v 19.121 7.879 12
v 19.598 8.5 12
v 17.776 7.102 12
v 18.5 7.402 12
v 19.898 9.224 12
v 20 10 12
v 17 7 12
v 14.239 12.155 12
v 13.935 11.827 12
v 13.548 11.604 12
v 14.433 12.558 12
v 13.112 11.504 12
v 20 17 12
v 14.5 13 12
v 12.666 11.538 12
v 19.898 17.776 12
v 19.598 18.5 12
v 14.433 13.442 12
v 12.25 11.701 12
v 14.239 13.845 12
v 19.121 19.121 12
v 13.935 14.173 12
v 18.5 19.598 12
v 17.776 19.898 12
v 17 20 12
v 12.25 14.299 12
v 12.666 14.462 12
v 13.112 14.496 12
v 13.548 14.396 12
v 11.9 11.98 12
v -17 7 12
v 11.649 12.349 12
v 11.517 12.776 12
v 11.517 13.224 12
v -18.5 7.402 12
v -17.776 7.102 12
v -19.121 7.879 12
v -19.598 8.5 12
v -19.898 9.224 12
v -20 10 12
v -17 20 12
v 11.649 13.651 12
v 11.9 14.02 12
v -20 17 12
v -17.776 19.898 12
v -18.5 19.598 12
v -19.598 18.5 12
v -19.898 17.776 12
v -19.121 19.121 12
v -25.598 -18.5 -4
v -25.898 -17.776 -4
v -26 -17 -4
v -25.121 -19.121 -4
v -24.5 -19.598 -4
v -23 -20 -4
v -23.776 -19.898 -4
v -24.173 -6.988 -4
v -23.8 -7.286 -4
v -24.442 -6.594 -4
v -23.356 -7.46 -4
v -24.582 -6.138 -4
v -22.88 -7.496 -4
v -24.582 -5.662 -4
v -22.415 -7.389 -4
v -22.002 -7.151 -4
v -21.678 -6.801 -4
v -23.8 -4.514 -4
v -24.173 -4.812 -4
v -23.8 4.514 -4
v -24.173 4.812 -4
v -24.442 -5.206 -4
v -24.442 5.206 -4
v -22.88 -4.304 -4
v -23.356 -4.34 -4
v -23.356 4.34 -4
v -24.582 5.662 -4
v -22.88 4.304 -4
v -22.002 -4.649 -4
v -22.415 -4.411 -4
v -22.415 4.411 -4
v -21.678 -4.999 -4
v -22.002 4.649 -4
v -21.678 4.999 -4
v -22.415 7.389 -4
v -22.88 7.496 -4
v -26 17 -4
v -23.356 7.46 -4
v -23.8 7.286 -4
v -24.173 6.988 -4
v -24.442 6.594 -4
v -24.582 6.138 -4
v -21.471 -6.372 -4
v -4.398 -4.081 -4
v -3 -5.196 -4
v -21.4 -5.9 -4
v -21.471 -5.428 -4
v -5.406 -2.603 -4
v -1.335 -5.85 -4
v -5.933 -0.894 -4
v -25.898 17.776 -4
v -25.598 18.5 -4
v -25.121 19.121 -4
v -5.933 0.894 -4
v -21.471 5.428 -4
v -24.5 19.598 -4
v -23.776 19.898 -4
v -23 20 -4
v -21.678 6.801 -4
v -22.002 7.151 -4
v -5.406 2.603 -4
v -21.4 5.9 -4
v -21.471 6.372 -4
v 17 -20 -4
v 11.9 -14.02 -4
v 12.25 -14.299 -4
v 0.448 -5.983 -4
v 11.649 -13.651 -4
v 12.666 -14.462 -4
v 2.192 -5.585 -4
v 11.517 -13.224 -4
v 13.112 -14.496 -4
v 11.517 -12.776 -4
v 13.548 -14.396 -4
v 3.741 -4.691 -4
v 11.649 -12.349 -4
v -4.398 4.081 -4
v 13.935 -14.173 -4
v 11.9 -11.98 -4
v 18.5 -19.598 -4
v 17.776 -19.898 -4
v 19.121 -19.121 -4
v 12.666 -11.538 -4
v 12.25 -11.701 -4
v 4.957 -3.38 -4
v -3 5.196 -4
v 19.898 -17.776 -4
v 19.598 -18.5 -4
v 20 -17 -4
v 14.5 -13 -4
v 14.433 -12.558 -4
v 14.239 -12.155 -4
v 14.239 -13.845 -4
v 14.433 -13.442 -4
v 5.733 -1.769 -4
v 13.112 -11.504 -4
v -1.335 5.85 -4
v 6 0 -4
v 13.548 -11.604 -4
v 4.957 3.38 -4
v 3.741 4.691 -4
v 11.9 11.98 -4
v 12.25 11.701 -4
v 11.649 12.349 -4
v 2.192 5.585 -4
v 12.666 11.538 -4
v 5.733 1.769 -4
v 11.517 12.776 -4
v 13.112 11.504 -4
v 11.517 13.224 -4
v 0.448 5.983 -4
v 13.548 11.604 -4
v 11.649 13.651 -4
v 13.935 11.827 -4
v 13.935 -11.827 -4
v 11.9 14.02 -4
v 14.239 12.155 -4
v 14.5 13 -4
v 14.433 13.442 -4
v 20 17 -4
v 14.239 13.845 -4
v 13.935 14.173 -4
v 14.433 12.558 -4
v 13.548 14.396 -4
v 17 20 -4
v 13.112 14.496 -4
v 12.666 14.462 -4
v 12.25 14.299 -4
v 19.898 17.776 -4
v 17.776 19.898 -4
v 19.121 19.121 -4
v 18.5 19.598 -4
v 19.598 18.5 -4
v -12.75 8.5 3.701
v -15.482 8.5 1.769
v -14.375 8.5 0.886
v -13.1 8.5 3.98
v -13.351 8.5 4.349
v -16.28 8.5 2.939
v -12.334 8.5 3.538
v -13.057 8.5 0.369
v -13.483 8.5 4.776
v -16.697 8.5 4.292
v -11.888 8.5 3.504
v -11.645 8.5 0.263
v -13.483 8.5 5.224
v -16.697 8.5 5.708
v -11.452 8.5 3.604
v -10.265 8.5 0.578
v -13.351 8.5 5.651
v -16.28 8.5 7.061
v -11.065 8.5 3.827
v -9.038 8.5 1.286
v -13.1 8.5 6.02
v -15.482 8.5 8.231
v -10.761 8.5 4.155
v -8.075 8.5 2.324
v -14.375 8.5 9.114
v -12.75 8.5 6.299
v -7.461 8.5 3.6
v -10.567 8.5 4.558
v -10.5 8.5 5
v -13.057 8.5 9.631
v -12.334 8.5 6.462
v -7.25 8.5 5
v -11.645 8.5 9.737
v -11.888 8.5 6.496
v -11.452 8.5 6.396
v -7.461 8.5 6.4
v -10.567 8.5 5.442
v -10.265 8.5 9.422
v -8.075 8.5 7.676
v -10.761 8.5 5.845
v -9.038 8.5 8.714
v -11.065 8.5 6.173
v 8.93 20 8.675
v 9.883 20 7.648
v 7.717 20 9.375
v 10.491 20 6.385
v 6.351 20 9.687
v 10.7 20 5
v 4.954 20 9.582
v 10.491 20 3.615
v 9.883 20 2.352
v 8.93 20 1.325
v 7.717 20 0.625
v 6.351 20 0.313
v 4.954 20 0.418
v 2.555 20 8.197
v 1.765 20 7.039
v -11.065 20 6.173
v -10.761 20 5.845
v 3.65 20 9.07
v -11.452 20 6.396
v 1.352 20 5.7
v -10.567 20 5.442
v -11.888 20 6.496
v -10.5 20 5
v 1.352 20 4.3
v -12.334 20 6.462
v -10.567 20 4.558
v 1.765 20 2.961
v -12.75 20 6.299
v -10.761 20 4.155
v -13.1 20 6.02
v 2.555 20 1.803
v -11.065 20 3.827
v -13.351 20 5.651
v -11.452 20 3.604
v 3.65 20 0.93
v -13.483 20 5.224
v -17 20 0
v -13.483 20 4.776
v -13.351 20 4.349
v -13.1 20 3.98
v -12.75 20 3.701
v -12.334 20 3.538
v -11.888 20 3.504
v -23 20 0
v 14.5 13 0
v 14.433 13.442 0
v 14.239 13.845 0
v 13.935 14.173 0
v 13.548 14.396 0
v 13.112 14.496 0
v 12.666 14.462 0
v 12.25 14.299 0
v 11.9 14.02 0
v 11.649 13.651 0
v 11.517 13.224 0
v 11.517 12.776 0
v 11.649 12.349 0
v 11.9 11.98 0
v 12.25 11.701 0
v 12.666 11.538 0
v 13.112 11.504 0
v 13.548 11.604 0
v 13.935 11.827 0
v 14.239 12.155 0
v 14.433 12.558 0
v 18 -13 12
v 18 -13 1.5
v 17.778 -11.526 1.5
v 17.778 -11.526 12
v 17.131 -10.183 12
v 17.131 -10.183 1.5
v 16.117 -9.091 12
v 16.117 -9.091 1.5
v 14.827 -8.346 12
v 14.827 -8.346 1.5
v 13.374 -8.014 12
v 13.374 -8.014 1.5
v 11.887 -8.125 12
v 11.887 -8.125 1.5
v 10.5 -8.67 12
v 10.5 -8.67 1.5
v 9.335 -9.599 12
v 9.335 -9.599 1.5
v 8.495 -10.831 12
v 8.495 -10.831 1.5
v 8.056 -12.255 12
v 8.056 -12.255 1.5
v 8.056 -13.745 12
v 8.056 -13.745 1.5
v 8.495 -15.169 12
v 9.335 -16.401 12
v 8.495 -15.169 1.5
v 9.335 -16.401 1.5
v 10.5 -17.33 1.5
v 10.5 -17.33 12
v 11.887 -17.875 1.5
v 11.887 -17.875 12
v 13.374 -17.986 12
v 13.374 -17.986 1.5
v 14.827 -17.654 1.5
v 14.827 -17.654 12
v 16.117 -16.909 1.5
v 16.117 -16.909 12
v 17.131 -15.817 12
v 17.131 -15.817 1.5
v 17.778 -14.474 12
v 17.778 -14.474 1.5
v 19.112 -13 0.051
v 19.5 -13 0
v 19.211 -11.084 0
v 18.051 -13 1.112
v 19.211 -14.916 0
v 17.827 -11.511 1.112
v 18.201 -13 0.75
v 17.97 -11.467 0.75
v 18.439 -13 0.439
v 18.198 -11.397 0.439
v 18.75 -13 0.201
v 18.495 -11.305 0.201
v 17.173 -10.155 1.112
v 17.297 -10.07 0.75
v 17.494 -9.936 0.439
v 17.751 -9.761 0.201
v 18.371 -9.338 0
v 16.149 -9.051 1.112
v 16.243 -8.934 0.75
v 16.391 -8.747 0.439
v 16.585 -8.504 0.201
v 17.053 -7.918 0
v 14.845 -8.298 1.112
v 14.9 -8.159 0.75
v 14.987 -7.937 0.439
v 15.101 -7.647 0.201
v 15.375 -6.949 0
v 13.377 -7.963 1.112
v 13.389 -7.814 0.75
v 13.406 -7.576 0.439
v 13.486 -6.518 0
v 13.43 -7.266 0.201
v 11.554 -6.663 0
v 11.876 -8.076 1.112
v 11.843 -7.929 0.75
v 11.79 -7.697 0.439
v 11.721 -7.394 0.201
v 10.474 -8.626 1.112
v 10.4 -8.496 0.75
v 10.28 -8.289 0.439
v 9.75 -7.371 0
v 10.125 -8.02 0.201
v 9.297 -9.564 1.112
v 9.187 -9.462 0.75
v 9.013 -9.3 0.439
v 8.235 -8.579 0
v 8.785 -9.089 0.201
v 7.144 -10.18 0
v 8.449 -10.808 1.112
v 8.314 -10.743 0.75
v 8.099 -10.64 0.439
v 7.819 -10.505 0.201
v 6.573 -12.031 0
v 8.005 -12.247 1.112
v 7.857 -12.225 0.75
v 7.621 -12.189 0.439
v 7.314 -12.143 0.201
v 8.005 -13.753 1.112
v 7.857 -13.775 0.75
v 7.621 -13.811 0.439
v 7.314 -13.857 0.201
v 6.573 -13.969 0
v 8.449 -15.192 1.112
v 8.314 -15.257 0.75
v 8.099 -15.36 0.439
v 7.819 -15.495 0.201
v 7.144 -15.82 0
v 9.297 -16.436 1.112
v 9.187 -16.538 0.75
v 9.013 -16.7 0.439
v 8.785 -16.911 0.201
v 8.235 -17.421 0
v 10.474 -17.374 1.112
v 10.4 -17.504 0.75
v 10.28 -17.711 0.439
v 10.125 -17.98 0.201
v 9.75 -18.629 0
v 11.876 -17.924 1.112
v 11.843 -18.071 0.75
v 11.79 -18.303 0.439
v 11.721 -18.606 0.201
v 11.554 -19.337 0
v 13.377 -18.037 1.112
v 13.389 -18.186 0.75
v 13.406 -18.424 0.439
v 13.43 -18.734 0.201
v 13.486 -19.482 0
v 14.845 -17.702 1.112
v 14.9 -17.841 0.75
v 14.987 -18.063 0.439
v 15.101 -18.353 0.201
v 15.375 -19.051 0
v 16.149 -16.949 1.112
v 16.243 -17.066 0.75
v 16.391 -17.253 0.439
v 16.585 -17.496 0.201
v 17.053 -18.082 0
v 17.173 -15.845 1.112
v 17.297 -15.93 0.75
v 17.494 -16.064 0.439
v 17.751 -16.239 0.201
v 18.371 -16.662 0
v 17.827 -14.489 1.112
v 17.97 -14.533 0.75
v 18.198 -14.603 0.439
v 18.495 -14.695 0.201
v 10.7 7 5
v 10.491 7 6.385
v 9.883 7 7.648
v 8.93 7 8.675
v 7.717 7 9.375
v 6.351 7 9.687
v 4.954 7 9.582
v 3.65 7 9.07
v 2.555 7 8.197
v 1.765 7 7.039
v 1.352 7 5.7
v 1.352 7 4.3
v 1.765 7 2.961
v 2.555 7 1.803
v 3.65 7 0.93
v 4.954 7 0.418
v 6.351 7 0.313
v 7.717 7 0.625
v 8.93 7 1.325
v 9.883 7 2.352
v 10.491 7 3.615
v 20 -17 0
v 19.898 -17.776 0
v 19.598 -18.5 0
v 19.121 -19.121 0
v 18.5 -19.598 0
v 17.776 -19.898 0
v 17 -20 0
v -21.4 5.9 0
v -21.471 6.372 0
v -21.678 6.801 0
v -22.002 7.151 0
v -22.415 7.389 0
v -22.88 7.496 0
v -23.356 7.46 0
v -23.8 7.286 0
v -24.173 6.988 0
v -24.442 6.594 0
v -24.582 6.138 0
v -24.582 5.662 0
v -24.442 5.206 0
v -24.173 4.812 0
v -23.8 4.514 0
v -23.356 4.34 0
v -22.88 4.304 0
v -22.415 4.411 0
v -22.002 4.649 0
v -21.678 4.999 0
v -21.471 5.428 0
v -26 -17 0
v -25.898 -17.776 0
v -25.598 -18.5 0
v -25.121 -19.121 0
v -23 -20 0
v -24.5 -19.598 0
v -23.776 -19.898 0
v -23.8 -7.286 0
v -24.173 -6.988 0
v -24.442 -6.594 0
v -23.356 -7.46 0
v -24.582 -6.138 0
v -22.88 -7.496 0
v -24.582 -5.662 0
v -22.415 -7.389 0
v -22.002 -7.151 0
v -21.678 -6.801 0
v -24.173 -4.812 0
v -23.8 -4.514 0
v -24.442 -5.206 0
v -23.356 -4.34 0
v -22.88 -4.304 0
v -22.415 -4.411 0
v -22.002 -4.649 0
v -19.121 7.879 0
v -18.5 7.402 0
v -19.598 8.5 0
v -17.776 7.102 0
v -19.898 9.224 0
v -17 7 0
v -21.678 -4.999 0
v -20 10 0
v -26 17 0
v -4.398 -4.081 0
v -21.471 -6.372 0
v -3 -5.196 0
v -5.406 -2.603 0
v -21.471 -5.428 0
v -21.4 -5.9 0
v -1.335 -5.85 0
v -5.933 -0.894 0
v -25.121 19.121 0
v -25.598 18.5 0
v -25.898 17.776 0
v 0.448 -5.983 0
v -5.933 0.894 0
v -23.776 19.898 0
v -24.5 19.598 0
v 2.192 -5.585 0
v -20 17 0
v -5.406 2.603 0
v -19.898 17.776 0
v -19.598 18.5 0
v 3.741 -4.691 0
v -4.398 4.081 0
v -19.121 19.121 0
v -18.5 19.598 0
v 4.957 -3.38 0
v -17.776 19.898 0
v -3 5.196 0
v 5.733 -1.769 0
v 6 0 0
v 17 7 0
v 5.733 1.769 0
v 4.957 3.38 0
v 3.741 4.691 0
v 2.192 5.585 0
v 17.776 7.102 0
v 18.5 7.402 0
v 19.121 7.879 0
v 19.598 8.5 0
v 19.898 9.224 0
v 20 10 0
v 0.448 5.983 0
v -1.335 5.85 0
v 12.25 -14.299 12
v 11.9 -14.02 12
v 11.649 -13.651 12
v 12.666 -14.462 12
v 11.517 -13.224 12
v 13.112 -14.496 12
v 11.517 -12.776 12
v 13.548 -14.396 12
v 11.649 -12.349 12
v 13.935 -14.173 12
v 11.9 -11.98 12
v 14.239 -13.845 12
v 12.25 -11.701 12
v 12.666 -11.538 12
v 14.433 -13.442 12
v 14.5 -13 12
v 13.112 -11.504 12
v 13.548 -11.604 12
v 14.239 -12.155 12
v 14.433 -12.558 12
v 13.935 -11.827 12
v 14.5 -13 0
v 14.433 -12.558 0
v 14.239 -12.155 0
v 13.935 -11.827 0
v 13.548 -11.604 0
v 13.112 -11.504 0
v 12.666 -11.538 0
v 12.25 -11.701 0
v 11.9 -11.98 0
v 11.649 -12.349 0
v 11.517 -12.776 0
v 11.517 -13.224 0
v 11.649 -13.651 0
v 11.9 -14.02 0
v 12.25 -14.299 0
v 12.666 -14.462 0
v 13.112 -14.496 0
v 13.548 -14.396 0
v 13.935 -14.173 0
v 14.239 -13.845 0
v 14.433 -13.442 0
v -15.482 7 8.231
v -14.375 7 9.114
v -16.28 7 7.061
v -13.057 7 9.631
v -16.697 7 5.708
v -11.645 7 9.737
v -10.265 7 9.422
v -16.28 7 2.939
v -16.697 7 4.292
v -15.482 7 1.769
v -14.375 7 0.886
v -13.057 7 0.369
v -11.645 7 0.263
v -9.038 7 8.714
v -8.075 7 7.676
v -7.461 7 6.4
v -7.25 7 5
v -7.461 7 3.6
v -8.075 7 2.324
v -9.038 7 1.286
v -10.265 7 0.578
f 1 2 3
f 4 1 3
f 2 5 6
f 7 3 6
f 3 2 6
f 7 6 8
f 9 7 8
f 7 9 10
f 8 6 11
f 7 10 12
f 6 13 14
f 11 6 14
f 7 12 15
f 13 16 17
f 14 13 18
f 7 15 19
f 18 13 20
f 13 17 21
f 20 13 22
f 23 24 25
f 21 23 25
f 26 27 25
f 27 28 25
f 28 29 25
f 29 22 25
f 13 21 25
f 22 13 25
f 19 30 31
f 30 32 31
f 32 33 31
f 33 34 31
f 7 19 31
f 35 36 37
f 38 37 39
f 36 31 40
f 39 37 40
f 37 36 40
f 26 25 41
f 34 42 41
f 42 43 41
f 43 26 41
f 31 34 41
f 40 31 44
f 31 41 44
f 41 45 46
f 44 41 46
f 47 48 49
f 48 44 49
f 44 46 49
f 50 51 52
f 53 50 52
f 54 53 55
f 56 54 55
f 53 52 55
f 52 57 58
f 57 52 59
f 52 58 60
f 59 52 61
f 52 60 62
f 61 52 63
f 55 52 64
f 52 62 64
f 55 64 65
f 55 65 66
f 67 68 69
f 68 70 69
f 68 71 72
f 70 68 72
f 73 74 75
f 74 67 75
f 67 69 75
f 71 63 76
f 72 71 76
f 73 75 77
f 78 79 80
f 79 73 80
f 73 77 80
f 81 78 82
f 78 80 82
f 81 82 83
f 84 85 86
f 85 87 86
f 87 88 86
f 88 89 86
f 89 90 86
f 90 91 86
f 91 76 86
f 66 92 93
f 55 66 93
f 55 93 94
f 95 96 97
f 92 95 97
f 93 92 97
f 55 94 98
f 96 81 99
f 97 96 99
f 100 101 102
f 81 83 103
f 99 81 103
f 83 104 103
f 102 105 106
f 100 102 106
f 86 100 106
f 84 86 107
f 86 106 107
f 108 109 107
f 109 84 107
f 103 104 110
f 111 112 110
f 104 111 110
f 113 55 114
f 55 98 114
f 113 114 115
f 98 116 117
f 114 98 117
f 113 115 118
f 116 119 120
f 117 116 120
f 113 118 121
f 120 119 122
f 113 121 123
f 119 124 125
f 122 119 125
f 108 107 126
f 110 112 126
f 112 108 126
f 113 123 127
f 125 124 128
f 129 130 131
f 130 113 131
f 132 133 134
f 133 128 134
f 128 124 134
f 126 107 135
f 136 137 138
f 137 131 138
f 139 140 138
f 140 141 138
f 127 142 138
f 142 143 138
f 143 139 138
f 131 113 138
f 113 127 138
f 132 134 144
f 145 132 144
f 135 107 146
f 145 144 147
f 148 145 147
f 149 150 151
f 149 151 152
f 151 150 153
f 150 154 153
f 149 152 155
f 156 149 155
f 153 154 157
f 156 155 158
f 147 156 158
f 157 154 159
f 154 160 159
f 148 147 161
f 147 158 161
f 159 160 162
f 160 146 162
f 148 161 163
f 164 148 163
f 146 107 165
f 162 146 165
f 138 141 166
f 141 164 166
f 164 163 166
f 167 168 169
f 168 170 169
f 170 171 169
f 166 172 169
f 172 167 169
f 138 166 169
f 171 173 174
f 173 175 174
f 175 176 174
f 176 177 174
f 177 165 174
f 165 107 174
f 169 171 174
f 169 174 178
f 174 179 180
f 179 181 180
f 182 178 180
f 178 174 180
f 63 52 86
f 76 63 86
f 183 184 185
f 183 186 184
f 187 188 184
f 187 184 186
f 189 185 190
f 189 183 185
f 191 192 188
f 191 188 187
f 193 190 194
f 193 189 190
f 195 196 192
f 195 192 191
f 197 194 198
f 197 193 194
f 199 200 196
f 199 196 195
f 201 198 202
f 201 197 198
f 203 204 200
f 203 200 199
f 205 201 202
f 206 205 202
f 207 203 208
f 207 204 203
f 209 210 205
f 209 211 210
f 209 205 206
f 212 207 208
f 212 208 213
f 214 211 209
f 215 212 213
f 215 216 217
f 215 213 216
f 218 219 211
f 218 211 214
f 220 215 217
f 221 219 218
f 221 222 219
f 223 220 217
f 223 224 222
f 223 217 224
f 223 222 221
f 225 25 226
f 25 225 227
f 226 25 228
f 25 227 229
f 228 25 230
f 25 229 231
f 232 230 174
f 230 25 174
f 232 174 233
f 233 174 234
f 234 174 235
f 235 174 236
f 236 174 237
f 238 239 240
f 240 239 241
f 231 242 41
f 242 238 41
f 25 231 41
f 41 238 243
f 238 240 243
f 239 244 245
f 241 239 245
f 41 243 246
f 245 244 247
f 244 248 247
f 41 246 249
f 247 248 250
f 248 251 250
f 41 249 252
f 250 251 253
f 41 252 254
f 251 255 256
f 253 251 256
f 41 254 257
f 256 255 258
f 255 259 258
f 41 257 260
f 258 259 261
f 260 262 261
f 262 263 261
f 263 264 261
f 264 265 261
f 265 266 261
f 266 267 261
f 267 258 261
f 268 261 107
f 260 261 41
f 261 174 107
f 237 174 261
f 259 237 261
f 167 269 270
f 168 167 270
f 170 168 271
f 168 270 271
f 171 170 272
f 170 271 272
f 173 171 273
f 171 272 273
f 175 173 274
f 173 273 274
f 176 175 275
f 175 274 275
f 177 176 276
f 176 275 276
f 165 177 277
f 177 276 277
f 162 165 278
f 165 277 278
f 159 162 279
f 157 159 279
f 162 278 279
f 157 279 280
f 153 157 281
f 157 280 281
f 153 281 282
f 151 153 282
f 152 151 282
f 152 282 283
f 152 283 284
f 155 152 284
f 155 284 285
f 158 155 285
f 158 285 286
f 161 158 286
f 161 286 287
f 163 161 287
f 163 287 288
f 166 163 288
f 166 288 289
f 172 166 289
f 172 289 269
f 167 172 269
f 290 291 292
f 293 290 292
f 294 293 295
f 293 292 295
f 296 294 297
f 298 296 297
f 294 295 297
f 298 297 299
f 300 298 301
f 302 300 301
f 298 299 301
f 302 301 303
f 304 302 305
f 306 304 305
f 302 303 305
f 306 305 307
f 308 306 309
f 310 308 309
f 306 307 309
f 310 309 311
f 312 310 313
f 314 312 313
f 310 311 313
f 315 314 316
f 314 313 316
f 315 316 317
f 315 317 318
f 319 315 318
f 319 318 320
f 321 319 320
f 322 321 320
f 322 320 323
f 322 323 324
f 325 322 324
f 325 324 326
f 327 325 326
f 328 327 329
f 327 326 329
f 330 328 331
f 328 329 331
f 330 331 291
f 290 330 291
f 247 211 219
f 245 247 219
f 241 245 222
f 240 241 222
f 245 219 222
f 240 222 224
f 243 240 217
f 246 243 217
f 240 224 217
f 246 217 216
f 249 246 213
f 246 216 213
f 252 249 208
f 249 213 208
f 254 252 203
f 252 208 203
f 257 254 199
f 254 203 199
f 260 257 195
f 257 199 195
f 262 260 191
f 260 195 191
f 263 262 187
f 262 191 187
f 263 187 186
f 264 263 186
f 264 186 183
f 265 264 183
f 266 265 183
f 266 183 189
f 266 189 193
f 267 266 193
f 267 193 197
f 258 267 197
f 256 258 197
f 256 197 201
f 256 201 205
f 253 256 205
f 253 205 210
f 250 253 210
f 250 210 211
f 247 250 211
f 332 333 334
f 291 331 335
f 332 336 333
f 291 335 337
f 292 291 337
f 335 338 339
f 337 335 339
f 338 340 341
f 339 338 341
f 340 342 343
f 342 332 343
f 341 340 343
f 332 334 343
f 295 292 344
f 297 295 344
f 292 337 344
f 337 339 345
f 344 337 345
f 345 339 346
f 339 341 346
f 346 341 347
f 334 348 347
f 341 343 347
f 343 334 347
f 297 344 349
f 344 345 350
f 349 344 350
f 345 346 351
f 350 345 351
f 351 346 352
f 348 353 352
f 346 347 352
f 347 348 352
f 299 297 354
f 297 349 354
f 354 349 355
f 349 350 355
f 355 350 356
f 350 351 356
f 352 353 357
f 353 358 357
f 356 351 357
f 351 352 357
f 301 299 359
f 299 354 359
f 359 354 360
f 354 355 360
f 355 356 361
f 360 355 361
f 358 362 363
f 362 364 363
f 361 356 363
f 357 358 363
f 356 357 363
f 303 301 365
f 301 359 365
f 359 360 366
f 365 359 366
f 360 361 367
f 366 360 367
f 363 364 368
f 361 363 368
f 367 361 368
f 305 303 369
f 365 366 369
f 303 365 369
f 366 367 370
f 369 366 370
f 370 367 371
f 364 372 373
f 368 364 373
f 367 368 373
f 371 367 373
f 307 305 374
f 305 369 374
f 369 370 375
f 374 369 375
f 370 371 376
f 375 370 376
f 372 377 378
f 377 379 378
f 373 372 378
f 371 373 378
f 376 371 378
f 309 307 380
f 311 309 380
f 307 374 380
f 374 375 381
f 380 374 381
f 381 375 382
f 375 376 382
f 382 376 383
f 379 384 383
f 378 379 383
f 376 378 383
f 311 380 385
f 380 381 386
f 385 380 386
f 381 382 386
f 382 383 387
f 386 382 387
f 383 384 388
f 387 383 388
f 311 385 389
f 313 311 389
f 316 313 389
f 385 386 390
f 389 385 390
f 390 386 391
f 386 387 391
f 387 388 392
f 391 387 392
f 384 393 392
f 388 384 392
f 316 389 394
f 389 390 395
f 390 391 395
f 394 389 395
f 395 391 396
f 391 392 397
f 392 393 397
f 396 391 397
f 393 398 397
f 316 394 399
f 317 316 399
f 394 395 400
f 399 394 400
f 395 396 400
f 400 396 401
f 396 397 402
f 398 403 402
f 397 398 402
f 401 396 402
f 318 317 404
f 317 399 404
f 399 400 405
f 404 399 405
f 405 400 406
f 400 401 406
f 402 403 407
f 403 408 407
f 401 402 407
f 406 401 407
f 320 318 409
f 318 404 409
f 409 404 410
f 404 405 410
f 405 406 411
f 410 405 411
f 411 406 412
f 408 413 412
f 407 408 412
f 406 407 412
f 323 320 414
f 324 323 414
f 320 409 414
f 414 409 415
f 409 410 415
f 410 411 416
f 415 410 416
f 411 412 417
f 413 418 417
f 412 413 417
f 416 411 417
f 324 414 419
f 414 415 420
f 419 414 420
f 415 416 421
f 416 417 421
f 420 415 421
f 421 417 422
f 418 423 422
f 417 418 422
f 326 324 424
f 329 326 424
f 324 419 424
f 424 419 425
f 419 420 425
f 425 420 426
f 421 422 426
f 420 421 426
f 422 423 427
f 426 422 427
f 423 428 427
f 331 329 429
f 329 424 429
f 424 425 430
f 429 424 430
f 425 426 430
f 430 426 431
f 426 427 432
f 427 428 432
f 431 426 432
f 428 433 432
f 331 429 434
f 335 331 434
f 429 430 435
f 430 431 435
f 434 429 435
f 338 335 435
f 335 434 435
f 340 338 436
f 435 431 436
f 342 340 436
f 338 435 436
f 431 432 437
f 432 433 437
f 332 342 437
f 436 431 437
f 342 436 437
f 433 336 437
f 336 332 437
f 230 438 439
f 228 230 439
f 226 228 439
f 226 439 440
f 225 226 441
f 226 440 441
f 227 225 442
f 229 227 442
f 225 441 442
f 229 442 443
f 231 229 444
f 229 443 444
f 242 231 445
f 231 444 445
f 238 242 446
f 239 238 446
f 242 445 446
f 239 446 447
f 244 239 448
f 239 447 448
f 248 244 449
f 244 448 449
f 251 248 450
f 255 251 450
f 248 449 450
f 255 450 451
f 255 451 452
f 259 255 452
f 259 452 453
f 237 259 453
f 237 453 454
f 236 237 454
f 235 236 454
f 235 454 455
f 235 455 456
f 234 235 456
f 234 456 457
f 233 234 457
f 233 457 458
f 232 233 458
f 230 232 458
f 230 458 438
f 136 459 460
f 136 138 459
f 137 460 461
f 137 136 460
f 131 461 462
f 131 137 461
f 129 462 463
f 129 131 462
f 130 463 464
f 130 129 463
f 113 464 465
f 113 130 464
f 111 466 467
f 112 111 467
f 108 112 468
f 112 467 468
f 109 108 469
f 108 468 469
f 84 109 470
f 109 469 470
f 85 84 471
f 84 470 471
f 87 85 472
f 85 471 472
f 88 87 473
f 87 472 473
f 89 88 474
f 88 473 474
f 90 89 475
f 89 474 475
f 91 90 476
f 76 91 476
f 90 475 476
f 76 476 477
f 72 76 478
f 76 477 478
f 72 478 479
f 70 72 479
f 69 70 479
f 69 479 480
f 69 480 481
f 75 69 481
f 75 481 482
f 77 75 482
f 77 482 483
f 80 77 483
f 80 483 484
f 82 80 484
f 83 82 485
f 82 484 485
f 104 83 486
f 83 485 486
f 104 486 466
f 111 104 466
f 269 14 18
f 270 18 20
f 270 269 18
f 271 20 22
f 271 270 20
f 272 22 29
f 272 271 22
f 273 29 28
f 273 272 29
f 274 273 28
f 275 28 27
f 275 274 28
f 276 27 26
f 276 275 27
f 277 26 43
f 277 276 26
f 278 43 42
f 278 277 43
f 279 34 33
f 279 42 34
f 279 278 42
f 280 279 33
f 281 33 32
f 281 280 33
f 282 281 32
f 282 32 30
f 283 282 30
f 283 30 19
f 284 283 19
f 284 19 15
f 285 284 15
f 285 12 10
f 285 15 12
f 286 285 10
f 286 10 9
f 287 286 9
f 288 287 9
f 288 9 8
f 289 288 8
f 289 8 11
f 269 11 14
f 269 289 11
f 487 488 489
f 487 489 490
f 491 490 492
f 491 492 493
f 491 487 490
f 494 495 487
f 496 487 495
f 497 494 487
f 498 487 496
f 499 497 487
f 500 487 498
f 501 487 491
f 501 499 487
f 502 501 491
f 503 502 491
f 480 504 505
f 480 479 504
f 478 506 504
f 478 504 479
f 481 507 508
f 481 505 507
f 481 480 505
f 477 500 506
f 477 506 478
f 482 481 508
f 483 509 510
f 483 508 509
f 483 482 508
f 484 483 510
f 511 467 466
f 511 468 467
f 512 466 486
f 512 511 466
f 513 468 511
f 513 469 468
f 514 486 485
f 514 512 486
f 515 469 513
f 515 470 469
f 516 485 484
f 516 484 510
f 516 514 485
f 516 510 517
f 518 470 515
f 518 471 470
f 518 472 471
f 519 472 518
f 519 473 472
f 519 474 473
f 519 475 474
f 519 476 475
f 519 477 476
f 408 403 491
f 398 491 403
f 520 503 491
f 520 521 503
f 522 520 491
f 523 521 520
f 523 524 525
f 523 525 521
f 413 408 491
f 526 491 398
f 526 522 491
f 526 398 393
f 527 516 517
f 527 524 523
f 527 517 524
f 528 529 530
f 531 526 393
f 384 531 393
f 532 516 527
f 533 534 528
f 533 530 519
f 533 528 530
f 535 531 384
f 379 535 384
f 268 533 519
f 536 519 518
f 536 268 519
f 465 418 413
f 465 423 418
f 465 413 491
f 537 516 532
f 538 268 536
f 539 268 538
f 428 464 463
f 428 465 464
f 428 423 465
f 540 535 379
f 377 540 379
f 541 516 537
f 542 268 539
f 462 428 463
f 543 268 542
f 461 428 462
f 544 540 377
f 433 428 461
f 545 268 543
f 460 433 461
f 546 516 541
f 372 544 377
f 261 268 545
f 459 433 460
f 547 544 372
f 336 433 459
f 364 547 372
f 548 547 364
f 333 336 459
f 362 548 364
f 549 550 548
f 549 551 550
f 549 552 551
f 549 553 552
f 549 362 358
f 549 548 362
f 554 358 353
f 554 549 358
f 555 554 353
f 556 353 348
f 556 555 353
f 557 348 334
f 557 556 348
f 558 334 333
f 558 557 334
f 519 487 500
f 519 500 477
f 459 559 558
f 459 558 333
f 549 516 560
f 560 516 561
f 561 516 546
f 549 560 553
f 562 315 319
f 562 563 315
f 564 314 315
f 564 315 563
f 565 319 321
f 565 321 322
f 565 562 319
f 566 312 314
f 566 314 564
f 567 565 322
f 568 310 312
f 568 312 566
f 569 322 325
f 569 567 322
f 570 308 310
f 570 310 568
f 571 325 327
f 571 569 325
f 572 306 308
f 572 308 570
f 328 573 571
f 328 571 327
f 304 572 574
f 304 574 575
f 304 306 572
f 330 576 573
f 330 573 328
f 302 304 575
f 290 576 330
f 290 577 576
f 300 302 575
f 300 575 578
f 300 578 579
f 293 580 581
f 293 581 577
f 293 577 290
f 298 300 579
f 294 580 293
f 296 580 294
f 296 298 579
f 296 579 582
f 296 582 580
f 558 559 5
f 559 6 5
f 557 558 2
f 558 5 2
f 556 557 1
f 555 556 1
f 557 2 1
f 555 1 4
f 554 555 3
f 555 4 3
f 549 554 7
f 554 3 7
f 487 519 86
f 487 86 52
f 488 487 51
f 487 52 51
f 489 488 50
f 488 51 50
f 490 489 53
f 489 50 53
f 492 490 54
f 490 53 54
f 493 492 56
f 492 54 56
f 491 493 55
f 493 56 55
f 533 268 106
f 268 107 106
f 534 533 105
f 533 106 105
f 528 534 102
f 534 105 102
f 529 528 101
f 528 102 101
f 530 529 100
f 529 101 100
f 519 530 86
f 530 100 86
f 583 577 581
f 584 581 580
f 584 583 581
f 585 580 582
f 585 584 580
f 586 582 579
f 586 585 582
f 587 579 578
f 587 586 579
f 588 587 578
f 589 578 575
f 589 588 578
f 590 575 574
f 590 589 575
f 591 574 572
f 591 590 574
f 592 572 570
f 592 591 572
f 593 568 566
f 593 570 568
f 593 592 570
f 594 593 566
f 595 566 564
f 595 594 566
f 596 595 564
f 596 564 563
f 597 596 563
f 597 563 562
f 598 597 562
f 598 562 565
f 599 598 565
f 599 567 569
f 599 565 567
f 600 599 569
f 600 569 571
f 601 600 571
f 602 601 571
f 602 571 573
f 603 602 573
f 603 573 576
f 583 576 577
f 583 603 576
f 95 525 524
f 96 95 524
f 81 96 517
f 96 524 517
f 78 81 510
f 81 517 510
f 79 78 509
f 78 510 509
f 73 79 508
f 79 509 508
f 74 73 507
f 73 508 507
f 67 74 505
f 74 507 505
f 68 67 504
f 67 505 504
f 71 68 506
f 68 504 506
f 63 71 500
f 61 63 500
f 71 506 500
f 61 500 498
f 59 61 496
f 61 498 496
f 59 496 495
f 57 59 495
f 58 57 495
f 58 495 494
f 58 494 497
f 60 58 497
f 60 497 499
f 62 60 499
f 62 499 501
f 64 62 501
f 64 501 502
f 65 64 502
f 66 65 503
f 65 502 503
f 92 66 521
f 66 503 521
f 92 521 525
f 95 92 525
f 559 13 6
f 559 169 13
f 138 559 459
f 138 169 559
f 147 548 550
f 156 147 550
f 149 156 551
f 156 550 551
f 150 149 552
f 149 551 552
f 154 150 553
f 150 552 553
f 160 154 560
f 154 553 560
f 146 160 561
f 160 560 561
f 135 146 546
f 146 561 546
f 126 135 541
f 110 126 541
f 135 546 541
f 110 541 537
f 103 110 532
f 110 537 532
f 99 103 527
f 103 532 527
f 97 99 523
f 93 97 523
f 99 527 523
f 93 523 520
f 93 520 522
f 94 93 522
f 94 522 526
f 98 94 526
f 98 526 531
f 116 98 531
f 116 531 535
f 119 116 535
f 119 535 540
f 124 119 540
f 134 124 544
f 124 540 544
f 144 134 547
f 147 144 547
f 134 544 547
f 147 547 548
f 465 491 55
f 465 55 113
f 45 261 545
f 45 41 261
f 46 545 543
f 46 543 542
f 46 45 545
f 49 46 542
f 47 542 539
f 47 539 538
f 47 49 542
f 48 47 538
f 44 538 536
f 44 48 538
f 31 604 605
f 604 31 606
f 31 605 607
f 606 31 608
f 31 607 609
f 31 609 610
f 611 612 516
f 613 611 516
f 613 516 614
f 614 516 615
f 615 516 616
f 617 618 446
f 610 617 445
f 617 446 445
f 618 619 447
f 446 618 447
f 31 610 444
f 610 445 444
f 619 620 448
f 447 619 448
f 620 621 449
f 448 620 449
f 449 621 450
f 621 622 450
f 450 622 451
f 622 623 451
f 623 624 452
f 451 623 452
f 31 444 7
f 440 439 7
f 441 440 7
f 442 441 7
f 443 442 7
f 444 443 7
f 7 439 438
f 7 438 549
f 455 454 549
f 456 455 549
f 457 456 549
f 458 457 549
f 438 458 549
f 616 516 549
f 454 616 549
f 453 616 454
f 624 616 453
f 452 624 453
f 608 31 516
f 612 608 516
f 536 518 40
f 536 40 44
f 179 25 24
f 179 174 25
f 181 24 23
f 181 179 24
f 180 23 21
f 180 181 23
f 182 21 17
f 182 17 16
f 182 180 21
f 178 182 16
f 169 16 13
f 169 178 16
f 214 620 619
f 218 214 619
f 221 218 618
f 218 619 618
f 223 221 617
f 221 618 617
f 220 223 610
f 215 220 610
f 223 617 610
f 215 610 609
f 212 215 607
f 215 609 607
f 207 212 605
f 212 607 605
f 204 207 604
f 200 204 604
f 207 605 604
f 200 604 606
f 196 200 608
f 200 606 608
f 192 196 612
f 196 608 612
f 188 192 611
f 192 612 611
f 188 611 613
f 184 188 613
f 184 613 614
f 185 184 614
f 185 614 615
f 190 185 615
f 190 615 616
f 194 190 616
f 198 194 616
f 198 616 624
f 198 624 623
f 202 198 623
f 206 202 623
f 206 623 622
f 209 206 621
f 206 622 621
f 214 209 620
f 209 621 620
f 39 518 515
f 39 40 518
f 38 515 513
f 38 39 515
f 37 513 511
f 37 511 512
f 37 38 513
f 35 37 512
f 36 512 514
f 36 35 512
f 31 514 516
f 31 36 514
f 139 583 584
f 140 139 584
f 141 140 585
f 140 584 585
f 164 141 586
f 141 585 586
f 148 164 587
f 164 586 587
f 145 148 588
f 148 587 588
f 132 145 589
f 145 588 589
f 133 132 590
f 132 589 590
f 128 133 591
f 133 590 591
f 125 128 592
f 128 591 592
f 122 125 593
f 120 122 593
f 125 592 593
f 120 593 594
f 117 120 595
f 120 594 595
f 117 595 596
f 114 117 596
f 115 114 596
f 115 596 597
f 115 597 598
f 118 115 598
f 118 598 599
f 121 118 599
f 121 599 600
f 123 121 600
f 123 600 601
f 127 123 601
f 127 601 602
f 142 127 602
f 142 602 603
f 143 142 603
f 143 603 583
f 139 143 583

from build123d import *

# Parameters (mm, degrees)
SKETCH_R             = 1.6
SKETCH_R_2           = 6
PAD_DEPTH            = 4
SKETCH001_R          = 5
PAD001_DEPTH         = 12
SKETCH002_R          = 4.7
POCKET_DEPTH         = 13.001
SKETCH003_R          = 4.75
POCKET001_DEPTH      = 1.5
SKETCH004_R          = 1.5
POCKET002_DEPTH      = 13.001
SKETCH005_R          = 1.5
POCKET003_DEPTH      = 4.001
POCKET003_DEPTH_BACK = -12.001
FILLET_R             = 3
FILLET001_R          = 1.5


with BuildPart() as part:
    # Sketch → Pad (new body)
    with BuildSketch(Plane.XY):
        Polygon((0, 20), (-26, 20), (-26, 0), (-26, -20), (0, -20), (20, -20), (20, 0), (20, 20), align=None)
        with Locations((-23, 5.9)):
            Circle(SKETCH_R, mode=Mode.SUBTRACT)
        with Locations((-23, -5.9)):
            Circle(SKETCH_R, mode=Mode.SUBTRACT)
        Circle(SKETCH_R_2, mode=Mode.SUBTRACT)
    extrude(amount=-PAD_DEPTH)

    # Sketch001 → Pad001 (join)
    with BuildSketch(Plane.XY):
        with Locations((13, -13)):
            Circle(SKETCH001_R)
        Polygon((0, 20), (20, 20), (20, 7), (0, 7), (-20, 7), (-20, 20), align=None)
    extrude(amount=PAD001_DEPTH)

    # Sketch002 (on DatumPlane) → Pocket (cut, through all)
    with BuildSketch(Plane.XZ.offset(-7)):
        with Locations((6, 5)):
            Circle(SKETCH002_R)
    extrude(amount=-POCKET_DEPTH, mode=Mode.SUBTRACT)

    # Sketch003 (on DatumPlane) → Pocket001 (cut)
    with BuildSketch(Plane.XZ.offset(-7)):
        with Locations((-12, 5)):
            Circle(SKETCH003_R)
    extrude(amount=-POCKET001_DEPTH, mode=Mode.SUBTRACT)

    # Sketch004 (on DatumPlane) → Pocket002 (cut, through all)
    with BuildSketch(Plane.XZ.offset(-7)):
        with Locations((-12, 5)):
            Circle(SKETCH004_R)
    extrude(amount=-POCKET002_DEPTH, mode=Mode.SUBTRACT)

    # Sketch005 → Pocket003 (cut, two sides)
    with BuildSketch(Plane.XY) as pocket003_sk:
        with Locations((13, -13)):
            Circle(SKETCH005_R)
        with Locations((13, 13)):
            Circle(SKETCH005_R)
    extrude(amount=-POCKET003_DEPTH, mode=Mode.SUBTRACT)
    extrude(pocket003_sk.sketch, amount=-POCKET003_DEPTH_BACK, mode=Mode.SUBTRACT)

    # Fillet
    fillet_edges = [part.edges().sort_by_distance(p)[0] for p in [
        (-26, -20, -2),
        (20, -20, -2),
        (20, 20, -2),
        (-26, 20, -2),
        (20, 7, 6),
        (-20, 7, 6),
        (-20, 20, 6),
    ]]
    fillet(fillet_edges, radius=FILLET_R)

    # Fillet001
    fillet001_edges = [part.edges().sort_by_distance(p)[0] for p in [
        (8, -13, 0),
    ]]
    fillet(fillet001_edges, radius=FILLET001_R)


solid = part.part
